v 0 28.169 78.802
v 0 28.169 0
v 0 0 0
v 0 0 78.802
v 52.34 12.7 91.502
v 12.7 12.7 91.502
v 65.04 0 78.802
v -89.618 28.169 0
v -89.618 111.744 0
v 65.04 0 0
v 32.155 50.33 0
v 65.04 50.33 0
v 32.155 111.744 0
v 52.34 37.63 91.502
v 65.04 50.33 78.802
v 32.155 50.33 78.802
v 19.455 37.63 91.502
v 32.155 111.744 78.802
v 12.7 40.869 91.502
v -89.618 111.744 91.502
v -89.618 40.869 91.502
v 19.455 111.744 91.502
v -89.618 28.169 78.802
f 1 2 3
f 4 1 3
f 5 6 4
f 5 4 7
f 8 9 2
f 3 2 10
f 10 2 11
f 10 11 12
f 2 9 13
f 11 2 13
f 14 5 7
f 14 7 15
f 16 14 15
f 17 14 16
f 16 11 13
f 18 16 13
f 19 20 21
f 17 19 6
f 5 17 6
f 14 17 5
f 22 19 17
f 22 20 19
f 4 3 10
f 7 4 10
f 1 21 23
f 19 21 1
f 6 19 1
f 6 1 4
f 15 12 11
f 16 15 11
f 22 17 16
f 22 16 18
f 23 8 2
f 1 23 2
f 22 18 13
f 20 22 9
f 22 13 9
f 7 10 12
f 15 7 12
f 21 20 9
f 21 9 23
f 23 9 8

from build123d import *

# Parameters (mm, degrees)
F0_W     = 32.155059278
F0_H     = 22.1614539623
F1_DEPTH = 91.5020089597
F2_SIZE  = 12.7


with BuildPart() as f1:
    # F0 (on Top) → F1 (new body)
    with BuildSketch(Plane.XY):
        Polygon((0, 28.1687378883), (0, 50.3301918507), (32.155059278, 50.3301918507), (32.155059278, 111.7442771792), (-89.617818594, 111.7442771792), (-89.617818594, 28.1687378883), align=None)
        with Locations((16.077529639, 39.2494648695)):
            Rectangle(F0_W, F0_H)
        Polygon((65.0401264429, 50.3301918507), (32.155059278, 50.3301918507), (32.155059278, 28.1687378883), (0, 28.1687378883), (0, 0), (65.0401264429, 0), align=None)
    extrude(amount=F1_DEPTH)

    # F2
    f2_edges = [f1.edges().sort_by_distance(p)[0] for p in [
        (-44.808909, 28.168738, 91.502009),
        (0, 14.084369, 91.502009),
        (32.520063, 0, 91.502009),
        (65.040126, 25.165096, 91.502009),
        (48.597593, 50.330192, 91.502009),
        (32.155059, 81.037235, 91.502009),
    ]]
    chamfer(f2_edges, length=F2_SIZE)


solid = f1.part
